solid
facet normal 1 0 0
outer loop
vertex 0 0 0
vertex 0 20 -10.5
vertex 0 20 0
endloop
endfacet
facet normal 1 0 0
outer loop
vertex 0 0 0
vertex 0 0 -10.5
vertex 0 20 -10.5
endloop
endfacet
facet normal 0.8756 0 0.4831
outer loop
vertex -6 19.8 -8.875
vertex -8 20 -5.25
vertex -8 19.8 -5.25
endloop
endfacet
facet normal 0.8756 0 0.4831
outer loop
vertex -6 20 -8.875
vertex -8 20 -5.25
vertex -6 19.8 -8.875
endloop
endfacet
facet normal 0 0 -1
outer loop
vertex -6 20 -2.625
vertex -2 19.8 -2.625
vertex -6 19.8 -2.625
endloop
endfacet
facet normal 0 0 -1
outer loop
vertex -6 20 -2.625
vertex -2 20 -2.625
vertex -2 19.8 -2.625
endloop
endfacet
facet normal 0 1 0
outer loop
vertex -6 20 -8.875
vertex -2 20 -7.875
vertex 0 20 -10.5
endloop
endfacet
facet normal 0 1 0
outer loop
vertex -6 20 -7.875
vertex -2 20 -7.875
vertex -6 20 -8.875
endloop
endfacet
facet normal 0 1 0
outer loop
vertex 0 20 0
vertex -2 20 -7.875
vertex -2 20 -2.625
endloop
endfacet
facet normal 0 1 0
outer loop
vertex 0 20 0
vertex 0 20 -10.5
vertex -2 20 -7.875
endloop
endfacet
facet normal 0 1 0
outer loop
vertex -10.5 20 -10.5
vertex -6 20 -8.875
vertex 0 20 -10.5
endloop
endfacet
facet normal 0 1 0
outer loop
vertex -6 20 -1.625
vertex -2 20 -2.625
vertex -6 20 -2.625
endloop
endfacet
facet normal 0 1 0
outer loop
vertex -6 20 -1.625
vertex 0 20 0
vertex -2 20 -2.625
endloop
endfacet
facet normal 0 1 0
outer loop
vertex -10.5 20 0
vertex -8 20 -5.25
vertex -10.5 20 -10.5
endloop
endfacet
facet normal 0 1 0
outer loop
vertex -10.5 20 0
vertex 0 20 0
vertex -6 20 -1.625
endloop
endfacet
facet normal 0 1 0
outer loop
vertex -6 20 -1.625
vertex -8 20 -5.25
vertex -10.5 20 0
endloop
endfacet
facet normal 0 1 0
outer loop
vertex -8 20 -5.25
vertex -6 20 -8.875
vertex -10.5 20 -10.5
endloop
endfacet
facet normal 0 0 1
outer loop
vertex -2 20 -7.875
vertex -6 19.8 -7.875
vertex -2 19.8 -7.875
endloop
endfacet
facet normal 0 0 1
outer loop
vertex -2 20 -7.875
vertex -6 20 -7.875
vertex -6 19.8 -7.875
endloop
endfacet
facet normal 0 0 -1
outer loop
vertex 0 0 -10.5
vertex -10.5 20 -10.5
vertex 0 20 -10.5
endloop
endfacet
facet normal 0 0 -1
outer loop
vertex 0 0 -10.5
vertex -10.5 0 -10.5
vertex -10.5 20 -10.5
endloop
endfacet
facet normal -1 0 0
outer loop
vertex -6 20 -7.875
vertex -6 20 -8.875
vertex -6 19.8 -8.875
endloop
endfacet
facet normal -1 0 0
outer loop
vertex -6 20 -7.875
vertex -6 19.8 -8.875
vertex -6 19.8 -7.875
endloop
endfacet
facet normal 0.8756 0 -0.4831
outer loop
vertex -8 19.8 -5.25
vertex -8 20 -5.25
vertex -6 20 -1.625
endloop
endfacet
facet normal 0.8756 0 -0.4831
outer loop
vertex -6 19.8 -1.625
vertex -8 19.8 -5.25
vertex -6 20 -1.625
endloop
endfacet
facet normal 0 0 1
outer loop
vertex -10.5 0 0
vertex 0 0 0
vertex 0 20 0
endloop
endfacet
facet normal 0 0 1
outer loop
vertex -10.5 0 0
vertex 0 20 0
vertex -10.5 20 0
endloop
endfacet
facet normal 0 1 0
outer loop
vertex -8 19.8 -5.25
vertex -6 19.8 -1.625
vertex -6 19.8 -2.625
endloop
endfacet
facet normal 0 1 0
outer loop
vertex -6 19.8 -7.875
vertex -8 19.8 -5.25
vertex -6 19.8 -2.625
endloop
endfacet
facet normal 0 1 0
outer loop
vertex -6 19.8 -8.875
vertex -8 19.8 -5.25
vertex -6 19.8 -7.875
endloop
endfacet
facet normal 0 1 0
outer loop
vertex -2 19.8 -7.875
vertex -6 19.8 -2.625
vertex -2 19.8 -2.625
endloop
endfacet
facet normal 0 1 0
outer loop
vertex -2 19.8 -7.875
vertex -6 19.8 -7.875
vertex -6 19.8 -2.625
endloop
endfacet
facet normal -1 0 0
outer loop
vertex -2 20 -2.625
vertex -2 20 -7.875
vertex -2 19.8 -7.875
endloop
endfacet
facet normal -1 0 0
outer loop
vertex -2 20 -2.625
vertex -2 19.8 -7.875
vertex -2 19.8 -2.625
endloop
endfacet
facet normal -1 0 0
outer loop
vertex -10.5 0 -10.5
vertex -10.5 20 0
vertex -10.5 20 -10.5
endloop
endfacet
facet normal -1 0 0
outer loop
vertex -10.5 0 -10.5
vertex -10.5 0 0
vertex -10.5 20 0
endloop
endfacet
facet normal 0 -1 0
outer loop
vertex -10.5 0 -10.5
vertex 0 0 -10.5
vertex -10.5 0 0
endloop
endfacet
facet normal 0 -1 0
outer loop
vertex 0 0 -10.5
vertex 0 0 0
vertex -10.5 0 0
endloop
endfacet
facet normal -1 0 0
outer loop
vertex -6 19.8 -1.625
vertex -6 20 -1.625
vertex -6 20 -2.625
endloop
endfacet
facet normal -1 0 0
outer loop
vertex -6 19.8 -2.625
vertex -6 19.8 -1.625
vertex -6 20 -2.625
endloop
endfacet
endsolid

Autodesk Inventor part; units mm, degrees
ref_plane "YZ Plane" through (0, 0, 0) normal (1, 0, 0) x (0, 1, 0)
ref_plane "XZ Plane" through (0, 0, 0) normal (0, 1, 0) x (-1, 0, 0)
ref_plane "XY Plane" through (0, 0, 0) normal (0, 0, 1) x (1, 0, 0)
sketch "Sketch1" plane through (0, 0, 0) normal (0, 1, 0) x (-1, 0, 0)
  line L0 (0, 0) -> (10.5, 0)
  line L1 (10.5, 0) -> (10.5, -10.5)
  line L2 (10.5, -10.5) -> (0, -10.5)
  line L3 (0, -10.5) -> (0, 0)
  dimension "d0" = 10.5
  dimension "d1" = 10.5
extrude "Extrusion1" add sketch "Sketch1" along normal blind 20
sketch "Sketch2" plane through (0, 20, 0) normal (0, 1, 0) x (1, 0, 0)
  line L0 (0, 0) -> (-2, 0)
  line L1 (-2, 0) -> (-2, 2.625)
  line L2 (-2, 2.625) -> (0, 2.625)
  line L3 (0, 2.625) -> (0, 0)
  line L4 (-2, 2.625) -> (-6, 2.625)
  line L5 (-6, 2.625) -> (-6, 7.875)
  line L6 (-6, 7.875) -> (-2, 7.875)
  line L7 (-2, 7.875) -> (-2, 2.625)
  line L8 (-6, 2.625) -> (-8, 2.625) construction
  line L9 (-8, 2.625) -> (-8, 1.625) construction
  line L10 (-8, 1.625) -> (-6, 1.625) construction
  line L11 (-6, 1.625) -> (-6, 2.625)
  line L12 (-6, 1.625) -> (-8, 1.625)
  line L13 (-8, 1.625) -> (-8, 8.875) construction
  line L14 (-8, 8.875) -> (-6, 8.875)
  line L15 (-6, 8.875) -> (-6, 1.625)
  line L16 (-8, 5.25) -> (-6, 1.625)
  line L17 (-8, 5.25) -> (-6, 8.875)
  dimension "d4" = 2
  dimension "d5" = 2.625
  dimension "d6" = 4
  dimension "d7" = 5.25
  dimension "d8" = 2
  dimension "d9" = 1
  dimension "d10" = 2
  dimension "d11" = 7.25
extrude "Extrusion2" cut sketch "Sketch2" against normal blind 0.2 contours L4 L5 L6 L7 | L11 L16 L17 L15 L5
properties part number "Air_heater_button"
